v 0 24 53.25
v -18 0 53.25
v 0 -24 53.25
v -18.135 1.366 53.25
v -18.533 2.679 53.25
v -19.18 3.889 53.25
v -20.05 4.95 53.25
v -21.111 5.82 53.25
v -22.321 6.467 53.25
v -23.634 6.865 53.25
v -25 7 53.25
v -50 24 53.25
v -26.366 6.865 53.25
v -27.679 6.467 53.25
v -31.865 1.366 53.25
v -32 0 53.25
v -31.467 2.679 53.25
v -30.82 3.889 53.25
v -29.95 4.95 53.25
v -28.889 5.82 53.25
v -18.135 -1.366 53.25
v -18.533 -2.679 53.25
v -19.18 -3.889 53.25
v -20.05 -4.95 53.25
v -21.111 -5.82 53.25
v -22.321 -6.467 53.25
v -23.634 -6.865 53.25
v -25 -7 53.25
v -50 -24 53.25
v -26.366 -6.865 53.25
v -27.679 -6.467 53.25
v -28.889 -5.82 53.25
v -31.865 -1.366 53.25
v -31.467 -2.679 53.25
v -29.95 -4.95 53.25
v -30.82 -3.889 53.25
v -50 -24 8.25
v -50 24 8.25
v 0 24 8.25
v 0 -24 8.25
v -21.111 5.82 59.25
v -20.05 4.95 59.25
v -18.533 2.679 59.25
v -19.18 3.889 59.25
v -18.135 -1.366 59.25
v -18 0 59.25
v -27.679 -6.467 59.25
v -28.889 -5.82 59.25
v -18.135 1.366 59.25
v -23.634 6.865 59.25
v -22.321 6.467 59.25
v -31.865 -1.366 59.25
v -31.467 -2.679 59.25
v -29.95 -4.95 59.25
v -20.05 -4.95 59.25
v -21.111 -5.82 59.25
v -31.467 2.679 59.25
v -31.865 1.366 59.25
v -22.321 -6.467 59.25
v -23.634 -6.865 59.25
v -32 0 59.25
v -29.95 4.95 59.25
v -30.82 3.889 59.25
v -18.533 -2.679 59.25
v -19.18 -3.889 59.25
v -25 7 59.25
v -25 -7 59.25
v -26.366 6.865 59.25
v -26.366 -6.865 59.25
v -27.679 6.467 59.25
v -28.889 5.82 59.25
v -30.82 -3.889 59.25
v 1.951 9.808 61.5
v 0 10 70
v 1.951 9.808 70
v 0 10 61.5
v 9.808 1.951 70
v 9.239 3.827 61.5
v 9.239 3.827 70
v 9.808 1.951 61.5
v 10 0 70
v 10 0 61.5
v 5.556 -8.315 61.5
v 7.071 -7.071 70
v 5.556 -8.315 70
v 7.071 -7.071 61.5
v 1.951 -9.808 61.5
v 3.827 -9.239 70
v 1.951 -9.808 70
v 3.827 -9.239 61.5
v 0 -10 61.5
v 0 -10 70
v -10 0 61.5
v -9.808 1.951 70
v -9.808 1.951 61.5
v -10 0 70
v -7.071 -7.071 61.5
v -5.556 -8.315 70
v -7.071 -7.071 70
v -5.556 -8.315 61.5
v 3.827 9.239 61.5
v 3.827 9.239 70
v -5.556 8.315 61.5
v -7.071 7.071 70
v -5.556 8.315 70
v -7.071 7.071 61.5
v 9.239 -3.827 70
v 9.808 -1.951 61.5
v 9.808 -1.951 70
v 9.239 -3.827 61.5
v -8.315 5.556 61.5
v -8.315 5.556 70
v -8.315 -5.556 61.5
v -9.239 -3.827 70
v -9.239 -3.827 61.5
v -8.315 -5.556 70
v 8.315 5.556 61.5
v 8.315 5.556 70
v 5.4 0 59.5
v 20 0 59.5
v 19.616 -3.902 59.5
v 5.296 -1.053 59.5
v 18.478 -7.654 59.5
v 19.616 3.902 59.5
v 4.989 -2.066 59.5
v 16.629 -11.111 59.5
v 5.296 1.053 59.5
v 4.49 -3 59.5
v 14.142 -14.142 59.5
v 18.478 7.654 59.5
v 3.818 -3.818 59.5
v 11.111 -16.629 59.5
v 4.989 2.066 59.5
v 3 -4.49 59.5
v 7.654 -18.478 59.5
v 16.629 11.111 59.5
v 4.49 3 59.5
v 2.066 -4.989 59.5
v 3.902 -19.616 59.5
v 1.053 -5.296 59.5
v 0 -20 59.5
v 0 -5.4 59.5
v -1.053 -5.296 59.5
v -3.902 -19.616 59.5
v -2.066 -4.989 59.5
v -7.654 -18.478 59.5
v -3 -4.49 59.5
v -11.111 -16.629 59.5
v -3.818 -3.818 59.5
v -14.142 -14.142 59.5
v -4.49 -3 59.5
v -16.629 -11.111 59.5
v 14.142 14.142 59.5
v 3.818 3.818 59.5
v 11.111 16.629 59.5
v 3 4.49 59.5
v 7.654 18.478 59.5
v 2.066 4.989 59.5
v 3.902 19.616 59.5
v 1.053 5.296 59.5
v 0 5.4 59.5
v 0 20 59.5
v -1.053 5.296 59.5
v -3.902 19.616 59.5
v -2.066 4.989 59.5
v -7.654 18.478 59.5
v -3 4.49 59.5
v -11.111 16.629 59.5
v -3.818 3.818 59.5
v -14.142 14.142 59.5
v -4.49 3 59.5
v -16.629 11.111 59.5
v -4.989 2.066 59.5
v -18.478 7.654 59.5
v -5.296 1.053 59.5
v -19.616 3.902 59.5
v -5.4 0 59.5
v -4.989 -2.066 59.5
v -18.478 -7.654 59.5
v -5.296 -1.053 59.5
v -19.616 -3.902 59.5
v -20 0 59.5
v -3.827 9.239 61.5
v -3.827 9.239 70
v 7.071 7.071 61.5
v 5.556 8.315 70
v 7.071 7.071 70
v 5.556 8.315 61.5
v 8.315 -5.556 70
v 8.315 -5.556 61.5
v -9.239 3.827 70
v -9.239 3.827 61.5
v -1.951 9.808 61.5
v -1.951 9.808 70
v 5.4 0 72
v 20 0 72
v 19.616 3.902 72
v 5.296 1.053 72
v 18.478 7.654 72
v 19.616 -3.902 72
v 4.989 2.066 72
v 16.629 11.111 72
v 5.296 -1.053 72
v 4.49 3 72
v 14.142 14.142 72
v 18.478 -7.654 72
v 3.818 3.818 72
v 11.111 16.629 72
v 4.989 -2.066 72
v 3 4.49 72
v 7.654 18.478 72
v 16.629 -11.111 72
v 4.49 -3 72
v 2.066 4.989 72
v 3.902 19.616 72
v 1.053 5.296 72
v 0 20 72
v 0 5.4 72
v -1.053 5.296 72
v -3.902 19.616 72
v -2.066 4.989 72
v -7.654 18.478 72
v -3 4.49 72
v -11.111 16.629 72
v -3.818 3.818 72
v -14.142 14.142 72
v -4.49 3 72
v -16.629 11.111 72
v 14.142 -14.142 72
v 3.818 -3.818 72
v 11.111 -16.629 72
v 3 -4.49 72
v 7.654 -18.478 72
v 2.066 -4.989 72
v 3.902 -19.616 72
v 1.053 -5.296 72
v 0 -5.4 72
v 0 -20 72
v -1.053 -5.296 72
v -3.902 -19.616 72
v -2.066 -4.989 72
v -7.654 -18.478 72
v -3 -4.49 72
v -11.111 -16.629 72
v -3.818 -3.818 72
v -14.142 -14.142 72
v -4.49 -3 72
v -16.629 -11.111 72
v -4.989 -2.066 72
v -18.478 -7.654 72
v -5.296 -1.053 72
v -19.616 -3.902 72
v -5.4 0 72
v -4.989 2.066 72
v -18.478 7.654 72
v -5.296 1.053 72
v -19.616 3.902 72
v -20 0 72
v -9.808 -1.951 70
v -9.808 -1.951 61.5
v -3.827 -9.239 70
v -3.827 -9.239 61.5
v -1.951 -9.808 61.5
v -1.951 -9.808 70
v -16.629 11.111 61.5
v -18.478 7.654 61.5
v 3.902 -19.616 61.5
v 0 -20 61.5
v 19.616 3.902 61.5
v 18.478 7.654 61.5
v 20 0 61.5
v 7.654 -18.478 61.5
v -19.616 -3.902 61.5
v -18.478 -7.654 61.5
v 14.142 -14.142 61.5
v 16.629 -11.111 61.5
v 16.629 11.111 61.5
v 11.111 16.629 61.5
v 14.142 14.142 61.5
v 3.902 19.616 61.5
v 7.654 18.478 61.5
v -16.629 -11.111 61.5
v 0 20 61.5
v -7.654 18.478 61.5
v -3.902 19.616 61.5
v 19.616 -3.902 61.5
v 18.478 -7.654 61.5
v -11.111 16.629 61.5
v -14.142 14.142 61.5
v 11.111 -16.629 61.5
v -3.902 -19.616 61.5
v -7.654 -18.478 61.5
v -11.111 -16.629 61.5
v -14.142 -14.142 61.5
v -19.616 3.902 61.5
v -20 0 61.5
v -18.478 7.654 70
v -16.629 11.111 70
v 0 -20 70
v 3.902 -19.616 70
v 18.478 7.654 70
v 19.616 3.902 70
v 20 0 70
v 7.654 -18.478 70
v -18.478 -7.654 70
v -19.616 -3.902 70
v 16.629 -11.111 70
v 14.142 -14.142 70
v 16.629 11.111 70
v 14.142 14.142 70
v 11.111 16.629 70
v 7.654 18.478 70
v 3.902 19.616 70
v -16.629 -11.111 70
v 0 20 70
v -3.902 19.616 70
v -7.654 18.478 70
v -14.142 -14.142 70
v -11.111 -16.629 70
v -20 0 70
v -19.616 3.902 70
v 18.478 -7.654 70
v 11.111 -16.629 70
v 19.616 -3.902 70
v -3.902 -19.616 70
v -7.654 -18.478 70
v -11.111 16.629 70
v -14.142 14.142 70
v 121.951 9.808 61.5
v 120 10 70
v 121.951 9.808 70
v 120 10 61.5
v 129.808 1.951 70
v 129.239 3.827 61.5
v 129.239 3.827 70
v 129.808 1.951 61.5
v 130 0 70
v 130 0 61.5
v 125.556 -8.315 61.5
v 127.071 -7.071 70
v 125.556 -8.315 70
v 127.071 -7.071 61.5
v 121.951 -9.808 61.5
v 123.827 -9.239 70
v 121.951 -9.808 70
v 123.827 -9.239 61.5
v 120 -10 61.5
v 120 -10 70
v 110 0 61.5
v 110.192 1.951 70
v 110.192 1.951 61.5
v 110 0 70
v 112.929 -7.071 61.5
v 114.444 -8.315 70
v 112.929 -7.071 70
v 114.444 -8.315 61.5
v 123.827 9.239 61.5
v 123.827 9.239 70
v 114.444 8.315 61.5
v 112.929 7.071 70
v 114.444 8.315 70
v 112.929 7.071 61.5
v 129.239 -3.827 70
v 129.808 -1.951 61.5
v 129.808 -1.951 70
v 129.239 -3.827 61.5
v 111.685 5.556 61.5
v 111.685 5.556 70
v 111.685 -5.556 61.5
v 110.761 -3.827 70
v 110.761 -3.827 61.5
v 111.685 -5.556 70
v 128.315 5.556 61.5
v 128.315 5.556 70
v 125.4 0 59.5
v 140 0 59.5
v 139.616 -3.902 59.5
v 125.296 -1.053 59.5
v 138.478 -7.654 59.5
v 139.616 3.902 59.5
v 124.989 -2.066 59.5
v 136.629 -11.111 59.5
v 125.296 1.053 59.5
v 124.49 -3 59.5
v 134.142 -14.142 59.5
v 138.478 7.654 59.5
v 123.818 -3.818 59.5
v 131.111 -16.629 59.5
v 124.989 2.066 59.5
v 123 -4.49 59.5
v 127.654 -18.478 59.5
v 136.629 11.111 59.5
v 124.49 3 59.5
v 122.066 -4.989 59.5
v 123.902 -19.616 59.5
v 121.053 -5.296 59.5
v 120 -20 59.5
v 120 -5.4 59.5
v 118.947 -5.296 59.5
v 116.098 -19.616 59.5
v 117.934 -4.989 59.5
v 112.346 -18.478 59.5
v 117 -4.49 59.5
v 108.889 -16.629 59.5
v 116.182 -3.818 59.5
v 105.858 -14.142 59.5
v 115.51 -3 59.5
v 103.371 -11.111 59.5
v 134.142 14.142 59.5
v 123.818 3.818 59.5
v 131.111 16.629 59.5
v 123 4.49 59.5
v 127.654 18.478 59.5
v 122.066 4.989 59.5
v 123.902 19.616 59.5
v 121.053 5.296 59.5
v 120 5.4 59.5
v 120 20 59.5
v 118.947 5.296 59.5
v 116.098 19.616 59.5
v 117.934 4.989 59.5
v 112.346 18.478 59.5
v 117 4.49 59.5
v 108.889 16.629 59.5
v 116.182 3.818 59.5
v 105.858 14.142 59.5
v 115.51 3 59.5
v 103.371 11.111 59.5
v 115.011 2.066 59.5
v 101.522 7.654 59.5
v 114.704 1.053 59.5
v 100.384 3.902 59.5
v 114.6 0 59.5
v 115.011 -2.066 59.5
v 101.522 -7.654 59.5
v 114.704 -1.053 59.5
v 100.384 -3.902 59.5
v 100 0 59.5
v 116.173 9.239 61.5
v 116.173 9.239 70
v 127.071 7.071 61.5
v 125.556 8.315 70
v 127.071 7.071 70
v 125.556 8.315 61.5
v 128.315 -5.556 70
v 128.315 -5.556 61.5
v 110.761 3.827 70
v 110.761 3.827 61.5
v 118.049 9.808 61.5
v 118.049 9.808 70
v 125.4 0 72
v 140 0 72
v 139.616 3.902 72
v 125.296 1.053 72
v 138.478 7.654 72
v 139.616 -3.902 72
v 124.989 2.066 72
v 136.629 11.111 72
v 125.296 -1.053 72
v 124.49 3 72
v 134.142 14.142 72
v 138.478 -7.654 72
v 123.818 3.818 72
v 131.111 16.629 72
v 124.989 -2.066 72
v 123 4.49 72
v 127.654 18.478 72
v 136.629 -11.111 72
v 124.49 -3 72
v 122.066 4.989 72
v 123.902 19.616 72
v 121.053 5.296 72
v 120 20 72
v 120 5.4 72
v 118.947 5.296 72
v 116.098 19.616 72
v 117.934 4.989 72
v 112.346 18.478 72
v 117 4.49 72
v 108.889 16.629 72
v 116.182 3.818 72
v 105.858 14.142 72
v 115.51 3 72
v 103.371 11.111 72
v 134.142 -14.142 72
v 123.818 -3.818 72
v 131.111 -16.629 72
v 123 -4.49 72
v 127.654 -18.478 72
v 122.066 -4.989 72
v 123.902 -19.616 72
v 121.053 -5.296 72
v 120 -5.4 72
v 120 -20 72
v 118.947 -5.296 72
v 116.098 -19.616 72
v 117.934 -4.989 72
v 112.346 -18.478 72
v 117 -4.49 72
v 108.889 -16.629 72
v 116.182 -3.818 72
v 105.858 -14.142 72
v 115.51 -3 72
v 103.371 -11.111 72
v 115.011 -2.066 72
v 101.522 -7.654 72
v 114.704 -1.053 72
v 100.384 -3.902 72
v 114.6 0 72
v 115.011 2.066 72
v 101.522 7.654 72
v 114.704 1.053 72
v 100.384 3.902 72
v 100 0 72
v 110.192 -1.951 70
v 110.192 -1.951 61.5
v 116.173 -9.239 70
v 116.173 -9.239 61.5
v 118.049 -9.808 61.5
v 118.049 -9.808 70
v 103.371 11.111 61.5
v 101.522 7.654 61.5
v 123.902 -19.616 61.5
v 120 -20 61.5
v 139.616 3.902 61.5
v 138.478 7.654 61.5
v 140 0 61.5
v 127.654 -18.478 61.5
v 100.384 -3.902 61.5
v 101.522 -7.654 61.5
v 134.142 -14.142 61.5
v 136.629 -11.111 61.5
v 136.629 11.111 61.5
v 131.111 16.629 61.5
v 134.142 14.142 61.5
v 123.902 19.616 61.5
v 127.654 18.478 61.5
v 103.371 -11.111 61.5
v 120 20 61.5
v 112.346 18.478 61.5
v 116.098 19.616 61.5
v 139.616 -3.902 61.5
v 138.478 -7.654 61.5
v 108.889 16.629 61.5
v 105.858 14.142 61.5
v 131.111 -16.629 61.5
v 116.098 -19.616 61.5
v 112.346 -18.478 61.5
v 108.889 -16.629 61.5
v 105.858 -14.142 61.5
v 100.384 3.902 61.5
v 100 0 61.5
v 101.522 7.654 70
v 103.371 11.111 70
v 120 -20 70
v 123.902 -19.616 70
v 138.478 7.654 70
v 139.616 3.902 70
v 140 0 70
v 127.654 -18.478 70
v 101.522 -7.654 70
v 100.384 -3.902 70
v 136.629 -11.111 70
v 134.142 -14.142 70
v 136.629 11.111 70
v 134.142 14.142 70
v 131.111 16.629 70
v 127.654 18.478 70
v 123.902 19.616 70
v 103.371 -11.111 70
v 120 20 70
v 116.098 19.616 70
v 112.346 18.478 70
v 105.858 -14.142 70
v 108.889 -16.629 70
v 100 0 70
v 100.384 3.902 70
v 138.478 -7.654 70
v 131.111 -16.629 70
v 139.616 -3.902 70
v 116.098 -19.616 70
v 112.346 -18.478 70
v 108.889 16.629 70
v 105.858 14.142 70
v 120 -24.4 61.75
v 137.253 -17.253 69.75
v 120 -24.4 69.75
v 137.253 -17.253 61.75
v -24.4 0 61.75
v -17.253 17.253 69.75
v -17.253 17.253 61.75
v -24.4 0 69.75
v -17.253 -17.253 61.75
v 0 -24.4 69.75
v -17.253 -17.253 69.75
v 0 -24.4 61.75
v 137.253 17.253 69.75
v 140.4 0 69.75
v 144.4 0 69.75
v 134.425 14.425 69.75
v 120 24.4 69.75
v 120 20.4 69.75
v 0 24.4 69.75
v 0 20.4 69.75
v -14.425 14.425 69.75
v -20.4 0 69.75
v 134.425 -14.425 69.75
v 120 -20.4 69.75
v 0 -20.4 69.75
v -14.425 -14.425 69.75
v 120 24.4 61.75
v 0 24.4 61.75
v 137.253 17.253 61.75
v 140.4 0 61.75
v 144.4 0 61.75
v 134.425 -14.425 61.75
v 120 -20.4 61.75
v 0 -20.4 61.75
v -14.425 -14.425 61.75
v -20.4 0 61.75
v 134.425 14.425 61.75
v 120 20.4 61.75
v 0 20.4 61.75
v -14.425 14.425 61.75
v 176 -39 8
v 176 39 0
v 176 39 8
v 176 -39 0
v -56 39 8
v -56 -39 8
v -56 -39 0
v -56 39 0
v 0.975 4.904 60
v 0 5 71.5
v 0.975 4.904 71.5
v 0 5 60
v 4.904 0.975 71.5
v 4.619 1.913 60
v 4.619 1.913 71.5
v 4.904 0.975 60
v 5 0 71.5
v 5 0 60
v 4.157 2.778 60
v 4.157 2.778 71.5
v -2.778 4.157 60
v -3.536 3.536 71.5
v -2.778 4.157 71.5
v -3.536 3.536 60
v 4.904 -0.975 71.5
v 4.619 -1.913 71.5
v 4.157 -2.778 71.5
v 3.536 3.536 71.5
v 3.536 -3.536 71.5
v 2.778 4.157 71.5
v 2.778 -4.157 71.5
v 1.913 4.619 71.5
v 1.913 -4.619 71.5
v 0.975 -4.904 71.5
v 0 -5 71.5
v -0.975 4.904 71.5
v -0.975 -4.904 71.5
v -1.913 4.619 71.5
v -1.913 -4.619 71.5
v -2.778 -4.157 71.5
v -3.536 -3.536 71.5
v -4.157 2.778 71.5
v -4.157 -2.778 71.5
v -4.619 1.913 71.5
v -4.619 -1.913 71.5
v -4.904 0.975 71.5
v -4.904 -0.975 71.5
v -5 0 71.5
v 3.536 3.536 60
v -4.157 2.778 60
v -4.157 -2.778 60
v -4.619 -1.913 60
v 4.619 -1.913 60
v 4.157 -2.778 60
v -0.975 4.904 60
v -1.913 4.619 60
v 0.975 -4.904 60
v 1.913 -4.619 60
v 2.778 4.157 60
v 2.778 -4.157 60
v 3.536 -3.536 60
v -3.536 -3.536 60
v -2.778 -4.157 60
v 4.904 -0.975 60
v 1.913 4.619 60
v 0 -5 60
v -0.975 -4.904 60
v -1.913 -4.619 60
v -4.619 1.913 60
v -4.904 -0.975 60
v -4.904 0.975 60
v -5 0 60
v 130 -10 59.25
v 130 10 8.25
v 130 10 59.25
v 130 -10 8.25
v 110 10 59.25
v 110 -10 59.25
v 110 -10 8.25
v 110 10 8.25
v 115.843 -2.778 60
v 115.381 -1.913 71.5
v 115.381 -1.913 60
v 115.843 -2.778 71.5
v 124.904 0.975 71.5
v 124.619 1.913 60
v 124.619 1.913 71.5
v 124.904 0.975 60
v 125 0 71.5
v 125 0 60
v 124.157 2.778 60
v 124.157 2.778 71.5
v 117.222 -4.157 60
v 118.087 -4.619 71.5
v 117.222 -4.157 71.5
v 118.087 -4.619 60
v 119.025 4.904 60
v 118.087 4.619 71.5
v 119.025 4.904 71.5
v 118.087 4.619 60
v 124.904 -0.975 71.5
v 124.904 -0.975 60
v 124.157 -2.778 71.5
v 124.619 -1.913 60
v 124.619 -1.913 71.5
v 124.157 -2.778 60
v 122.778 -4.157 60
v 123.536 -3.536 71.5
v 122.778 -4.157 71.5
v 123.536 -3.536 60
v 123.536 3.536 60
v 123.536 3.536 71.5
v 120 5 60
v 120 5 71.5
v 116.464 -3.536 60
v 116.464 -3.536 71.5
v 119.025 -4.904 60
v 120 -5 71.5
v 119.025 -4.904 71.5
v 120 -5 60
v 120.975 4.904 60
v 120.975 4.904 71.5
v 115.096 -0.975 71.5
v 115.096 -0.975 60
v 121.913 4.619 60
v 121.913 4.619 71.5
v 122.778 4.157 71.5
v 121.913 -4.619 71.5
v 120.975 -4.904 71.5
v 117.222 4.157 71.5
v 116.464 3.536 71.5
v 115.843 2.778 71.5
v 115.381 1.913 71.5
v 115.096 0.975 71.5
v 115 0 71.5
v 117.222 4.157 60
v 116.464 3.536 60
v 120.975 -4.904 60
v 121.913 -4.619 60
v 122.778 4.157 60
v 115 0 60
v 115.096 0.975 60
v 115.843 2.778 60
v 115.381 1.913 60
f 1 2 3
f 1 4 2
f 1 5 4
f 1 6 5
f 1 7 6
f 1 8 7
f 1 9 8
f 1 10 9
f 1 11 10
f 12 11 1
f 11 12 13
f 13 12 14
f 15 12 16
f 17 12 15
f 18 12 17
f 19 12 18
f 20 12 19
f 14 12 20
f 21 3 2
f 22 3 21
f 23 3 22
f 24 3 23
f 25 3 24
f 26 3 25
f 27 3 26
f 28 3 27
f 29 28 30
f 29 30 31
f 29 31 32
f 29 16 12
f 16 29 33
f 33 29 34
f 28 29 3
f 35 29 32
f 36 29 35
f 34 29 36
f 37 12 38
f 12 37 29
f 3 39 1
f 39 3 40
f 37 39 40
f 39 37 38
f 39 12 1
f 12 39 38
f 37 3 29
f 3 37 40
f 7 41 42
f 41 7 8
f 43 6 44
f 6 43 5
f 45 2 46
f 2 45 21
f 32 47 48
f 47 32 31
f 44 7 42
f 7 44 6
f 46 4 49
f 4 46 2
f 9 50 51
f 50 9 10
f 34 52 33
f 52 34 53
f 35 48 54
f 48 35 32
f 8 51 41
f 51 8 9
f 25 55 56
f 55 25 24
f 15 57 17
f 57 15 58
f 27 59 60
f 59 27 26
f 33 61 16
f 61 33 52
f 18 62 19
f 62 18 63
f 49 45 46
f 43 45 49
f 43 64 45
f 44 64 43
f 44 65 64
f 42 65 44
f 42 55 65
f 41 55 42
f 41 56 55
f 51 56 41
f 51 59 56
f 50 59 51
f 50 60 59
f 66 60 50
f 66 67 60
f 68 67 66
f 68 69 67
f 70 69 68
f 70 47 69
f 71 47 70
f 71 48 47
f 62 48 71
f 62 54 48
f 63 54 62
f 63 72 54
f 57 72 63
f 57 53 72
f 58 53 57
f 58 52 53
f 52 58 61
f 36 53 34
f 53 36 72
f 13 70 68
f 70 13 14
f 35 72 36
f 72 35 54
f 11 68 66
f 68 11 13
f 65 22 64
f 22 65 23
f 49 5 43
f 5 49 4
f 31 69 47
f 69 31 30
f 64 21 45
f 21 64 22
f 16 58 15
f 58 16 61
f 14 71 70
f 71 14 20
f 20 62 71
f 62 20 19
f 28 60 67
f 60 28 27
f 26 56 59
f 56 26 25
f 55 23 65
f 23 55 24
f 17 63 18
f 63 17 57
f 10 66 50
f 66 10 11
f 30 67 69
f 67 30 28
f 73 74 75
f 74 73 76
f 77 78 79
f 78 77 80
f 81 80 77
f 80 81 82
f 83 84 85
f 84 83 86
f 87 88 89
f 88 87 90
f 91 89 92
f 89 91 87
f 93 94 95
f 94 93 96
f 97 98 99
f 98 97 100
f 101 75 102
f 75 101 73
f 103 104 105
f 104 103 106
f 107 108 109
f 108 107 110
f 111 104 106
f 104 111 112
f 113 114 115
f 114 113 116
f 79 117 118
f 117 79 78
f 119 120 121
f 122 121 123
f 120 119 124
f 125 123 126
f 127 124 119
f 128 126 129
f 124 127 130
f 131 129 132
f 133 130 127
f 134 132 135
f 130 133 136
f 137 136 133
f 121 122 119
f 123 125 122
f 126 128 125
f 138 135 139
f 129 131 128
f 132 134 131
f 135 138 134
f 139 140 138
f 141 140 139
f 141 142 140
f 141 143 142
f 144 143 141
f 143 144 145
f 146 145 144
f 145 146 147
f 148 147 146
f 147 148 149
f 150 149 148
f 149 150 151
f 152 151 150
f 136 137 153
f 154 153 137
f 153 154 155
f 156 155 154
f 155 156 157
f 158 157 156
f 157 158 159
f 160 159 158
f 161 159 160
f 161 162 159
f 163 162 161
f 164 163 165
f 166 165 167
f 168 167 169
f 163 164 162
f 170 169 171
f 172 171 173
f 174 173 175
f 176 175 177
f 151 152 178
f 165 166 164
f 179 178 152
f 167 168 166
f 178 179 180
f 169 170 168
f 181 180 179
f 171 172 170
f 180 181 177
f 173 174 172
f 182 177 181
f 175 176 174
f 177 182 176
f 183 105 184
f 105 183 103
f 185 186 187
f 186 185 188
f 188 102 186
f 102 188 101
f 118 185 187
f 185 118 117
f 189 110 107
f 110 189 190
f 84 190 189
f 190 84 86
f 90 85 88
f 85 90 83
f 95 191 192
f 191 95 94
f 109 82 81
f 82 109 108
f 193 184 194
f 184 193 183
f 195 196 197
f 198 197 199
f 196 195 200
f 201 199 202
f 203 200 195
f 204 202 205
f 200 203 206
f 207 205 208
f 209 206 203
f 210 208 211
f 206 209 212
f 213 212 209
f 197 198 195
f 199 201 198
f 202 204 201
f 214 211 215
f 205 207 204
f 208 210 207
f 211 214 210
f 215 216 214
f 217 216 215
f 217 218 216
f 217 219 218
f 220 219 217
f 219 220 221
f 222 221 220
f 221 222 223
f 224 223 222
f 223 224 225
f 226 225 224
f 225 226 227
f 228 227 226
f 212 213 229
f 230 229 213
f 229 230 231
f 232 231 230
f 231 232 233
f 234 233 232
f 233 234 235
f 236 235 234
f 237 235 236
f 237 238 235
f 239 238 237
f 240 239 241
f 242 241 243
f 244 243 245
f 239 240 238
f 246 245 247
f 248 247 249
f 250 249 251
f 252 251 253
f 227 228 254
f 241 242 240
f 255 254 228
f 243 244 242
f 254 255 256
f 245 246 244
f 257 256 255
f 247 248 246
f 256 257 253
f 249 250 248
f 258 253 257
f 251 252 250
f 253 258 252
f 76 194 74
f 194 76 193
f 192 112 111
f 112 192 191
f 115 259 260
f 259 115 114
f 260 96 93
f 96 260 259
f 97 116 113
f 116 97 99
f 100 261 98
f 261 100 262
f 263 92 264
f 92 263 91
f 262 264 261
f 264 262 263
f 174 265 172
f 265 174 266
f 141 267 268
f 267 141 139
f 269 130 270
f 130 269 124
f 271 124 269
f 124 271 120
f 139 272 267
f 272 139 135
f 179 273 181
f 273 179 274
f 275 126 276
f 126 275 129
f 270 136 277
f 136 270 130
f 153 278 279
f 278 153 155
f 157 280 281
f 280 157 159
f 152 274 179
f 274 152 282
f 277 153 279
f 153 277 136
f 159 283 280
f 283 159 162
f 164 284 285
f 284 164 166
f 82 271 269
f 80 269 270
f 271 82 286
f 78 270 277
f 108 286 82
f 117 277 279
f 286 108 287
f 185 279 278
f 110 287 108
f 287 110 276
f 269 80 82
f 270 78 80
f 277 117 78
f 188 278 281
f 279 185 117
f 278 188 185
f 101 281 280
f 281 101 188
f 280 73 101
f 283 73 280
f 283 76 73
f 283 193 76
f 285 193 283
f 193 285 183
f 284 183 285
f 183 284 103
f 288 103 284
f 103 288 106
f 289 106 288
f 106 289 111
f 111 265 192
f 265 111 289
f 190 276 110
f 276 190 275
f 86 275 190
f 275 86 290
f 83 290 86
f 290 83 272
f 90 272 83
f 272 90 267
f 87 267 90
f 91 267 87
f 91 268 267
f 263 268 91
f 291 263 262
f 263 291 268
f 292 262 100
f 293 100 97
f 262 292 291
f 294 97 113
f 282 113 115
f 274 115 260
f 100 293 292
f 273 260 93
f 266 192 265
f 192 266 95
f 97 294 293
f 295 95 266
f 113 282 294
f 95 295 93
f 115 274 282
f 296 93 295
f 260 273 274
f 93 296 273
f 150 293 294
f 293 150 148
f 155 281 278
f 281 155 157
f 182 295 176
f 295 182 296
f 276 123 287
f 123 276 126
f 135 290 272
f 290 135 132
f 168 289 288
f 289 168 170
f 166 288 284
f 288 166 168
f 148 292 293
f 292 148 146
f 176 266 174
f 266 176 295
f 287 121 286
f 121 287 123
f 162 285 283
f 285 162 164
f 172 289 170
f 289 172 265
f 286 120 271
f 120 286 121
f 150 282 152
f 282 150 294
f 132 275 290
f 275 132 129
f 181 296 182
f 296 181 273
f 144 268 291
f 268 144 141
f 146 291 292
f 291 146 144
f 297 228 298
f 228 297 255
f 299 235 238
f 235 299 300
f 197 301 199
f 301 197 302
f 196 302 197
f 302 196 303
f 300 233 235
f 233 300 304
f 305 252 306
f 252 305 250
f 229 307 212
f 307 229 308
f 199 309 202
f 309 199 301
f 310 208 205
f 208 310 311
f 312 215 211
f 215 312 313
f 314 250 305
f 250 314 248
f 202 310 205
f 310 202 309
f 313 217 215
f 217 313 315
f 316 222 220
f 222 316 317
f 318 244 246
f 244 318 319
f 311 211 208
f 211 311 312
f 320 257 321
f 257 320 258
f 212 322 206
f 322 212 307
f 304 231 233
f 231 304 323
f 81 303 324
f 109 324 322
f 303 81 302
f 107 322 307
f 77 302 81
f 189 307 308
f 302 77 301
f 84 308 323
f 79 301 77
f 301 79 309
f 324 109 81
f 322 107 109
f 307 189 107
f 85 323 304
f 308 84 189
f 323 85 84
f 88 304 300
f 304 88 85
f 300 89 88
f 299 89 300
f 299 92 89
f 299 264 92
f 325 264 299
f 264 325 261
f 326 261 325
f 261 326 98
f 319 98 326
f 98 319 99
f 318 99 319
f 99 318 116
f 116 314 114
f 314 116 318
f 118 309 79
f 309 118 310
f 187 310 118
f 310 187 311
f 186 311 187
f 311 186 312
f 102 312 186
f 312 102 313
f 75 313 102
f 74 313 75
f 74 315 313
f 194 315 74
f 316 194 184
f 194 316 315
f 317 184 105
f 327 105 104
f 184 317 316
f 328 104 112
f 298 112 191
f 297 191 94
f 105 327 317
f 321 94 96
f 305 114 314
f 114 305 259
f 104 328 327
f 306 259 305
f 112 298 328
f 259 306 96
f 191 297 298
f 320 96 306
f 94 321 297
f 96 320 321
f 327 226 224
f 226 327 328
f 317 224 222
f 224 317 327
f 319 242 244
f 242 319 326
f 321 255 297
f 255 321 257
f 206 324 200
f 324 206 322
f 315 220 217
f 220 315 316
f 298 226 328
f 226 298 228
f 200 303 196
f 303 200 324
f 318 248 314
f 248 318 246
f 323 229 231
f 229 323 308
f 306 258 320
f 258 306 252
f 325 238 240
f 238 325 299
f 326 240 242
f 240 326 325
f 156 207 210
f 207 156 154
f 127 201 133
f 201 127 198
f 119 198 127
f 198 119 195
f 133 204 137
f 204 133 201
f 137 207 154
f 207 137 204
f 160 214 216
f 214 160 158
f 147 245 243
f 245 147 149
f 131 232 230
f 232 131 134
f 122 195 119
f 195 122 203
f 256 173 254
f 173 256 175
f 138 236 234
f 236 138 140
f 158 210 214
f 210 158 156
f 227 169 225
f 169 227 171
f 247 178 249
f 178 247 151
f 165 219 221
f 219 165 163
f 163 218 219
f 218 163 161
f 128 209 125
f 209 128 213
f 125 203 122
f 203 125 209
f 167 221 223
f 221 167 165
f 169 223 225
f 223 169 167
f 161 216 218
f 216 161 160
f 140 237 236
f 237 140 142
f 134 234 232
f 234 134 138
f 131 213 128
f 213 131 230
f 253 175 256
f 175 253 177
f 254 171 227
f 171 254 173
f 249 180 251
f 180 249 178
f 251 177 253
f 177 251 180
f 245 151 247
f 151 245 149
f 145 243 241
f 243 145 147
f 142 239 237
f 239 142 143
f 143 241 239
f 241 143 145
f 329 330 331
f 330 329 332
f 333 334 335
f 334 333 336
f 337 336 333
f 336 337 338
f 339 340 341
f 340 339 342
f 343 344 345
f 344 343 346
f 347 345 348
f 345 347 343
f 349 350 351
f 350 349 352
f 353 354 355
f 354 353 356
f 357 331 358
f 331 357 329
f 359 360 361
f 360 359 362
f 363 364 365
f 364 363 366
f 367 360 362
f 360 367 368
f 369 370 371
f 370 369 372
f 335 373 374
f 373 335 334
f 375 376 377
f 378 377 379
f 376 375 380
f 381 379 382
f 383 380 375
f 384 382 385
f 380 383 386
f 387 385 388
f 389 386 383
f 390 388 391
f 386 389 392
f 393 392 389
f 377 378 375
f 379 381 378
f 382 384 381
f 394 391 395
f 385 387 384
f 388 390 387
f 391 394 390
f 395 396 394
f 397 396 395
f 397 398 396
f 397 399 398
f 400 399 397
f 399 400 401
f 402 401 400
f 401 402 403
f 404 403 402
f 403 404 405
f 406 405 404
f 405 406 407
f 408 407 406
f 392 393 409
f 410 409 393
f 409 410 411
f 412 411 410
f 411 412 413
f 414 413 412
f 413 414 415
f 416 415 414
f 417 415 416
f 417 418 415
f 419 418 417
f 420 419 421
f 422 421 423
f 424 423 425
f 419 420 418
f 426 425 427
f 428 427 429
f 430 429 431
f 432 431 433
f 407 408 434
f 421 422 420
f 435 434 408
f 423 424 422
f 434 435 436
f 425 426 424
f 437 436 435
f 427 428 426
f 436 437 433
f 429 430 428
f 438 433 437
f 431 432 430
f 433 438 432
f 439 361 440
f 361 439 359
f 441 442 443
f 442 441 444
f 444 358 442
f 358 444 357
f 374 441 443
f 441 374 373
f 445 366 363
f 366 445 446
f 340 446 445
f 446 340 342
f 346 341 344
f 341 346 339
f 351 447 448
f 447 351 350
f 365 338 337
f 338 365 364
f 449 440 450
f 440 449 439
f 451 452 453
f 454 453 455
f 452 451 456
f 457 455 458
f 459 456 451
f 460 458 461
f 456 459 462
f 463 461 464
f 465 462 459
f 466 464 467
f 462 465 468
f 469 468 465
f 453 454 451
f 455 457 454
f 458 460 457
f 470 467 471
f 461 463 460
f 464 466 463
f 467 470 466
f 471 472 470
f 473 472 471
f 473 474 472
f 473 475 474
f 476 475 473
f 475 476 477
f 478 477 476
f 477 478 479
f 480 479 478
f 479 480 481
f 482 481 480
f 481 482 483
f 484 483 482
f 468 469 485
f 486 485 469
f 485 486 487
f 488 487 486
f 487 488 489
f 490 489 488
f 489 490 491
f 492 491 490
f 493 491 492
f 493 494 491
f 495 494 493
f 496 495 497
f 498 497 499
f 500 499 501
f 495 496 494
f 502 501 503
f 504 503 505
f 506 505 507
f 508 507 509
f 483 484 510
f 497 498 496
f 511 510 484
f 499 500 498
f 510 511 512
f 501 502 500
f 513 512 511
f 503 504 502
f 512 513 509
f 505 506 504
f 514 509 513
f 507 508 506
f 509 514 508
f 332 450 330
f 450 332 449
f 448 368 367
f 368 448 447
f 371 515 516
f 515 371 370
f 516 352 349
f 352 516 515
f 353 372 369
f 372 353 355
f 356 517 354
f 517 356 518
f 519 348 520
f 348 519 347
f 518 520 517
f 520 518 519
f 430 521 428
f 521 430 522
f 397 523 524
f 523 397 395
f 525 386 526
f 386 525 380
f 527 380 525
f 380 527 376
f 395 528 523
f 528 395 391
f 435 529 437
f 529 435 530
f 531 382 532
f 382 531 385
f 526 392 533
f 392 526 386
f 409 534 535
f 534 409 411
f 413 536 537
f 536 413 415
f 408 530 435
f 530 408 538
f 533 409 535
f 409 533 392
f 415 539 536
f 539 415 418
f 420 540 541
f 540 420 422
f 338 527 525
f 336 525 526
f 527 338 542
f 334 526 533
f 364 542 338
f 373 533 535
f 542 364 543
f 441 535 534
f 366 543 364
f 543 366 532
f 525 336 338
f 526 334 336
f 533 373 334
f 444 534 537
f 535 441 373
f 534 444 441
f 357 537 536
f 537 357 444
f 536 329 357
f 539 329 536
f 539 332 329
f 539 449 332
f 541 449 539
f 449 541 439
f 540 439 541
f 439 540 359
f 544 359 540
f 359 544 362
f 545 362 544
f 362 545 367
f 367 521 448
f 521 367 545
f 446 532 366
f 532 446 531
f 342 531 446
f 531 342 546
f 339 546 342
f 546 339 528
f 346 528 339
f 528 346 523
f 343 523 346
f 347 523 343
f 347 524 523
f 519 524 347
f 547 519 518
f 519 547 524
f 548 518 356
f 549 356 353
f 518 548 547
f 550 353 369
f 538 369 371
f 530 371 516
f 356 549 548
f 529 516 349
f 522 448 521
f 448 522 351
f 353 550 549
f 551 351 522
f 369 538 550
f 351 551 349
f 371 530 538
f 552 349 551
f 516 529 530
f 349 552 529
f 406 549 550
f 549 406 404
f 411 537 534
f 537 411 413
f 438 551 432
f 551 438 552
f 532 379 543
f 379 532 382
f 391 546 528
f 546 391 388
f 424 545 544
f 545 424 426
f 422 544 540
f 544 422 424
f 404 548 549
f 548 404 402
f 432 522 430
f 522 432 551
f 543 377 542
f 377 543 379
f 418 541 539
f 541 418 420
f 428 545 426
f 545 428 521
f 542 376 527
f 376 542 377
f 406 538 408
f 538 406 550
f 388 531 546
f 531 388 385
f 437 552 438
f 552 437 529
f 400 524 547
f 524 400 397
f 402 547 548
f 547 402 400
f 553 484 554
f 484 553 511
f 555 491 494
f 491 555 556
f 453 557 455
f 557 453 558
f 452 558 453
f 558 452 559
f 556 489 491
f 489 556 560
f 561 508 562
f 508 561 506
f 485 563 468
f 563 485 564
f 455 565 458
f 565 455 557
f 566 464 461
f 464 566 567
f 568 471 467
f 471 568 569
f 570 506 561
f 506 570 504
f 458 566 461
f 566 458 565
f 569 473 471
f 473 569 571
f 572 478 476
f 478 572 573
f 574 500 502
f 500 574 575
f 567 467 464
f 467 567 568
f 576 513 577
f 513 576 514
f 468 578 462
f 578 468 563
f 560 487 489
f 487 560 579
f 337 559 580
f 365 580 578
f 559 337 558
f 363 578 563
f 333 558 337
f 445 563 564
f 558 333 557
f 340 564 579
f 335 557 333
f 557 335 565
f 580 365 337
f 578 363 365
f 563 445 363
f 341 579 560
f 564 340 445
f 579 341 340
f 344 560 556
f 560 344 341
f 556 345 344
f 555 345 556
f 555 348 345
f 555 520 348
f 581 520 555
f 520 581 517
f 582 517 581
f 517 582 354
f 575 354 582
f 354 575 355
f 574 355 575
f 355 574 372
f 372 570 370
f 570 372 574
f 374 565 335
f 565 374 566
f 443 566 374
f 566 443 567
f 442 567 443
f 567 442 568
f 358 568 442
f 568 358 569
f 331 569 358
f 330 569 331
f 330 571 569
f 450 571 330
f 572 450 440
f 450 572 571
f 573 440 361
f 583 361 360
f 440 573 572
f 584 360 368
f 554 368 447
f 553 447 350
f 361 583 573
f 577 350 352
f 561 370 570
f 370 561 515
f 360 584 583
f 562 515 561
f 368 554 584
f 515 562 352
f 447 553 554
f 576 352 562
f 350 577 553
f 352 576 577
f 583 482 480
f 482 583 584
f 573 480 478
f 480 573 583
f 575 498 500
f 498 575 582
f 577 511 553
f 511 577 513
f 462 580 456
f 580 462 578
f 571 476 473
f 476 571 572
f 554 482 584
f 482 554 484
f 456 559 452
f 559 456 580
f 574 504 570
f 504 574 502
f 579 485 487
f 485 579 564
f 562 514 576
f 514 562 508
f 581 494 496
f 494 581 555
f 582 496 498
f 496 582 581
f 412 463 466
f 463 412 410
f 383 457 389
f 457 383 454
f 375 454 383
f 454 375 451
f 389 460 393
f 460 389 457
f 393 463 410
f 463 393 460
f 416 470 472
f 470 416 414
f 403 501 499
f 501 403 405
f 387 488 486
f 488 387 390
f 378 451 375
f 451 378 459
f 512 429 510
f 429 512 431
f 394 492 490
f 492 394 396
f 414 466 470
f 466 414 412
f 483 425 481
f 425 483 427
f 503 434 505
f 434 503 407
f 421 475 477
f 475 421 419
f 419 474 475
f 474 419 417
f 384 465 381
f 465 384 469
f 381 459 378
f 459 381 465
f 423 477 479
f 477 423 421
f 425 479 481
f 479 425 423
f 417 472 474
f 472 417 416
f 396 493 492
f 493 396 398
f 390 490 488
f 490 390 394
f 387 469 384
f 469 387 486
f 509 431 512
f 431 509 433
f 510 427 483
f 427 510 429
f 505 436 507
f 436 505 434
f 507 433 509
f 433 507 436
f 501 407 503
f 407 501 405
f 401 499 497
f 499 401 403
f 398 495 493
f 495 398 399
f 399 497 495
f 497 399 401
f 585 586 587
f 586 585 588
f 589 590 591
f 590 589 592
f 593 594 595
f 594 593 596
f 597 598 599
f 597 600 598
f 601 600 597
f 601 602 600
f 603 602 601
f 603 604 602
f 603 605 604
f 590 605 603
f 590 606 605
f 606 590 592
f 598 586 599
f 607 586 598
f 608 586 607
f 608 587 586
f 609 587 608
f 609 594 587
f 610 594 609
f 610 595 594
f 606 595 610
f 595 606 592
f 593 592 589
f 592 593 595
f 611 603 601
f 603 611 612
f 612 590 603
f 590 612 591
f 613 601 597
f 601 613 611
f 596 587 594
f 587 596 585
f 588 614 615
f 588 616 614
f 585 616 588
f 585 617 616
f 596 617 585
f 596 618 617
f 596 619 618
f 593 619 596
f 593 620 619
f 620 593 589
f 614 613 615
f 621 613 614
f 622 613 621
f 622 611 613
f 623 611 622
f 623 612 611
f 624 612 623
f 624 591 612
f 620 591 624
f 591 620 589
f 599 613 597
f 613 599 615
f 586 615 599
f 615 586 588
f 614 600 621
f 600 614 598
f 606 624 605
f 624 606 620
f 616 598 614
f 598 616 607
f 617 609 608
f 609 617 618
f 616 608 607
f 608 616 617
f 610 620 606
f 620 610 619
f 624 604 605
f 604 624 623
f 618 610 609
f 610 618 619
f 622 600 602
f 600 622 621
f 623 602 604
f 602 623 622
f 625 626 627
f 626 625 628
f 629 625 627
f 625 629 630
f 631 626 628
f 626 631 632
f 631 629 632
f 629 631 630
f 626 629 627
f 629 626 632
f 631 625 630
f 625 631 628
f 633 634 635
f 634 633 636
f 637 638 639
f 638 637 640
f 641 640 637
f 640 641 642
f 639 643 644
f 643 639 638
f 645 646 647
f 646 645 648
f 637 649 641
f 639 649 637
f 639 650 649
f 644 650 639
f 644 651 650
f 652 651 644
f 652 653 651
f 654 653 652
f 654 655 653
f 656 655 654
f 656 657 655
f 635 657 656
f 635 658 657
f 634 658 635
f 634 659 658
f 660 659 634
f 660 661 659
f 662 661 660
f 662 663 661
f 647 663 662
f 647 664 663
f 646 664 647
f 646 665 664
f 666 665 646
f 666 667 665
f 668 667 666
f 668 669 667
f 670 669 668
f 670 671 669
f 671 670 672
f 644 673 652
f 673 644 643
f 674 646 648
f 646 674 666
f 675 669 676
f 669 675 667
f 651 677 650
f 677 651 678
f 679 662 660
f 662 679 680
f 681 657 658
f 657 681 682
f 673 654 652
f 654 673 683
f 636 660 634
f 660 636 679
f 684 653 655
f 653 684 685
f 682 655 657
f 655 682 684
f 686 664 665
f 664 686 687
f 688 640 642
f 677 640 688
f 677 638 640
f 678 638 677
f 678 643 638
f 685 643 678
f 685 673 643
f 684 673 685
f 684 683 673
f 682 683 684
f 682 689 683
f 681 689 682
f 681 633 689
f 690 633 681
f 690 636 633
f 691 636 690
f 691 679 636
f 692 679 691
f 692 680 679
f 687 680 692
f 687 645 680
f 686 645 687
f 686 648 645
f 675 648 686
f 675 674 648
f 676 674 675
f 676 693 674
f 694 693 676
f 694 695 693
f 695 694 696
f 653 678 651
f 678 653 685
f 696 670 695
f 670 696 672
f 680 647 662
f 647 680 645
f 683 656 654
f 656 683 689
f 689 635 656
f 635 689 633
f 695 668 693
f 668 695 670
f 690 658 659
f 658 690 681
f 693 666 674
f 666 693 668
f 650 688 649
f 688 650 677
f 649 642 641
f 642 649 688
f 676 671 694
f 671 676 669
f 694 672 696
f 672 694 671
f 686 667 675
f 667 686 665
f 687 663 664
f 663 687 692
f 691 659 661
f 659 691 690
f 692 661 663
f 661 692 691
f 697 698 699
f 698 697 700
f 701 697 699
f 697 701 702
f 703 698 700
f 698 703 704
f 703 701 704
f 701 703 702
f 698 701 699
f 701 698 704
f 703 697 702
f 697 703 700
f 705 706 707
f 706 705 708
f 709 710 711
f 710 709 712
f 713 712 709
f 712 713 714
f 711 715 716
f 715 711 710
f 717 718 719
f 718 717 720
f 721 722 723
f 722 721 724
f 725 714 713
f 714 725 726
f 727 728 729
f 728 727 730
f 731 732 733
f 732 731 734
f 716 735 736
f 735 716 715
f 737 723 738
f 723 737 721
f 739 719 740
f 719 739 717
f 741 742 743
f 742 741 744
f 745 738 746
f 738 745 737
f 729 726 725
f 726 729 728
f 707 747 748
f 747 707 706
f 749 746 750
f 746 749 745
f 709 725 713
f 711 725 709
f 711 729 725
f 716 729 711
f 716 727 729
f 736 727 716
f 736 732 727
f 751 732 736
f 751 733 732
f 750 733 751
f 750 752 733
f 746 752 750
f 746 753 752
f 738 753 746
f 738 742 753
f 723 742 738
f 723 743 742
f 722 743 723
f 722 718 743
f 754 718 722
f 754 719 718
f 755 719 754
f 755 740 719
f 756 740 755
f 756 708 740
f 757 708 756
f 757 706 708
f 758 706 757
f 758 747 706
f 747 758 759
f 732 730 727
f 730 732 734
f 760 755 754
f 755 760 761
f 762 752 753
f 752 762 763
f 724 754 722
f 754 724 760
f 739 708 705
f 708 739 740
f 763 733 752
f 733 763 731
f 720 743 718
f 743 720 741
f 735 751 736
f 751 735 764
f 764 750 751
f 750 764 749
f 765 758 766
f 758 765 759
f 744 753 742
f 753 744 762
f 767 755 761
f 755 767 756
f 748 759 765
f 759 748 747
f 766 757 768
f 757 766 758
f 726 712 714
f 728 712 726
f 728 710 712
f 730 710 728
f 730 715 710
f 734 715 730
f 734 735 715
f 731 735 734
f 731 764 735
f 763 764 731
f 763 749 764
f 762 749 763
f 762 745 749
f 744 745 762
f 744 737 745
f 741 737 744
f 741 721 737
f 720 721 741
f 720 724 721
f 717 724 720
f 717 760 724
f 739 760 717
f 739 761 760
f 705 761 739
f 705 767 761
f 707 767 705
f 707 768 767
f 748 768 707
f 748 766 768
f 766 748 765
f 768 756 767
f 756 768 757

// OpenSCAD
$fn = 32;

// ------------------------------------------------------------------------
// Motor belt drive: span 120 mm, pulleys d40, belt 8 mm wide
// Every part is its own module, assembly() places every instance.
// ------------------------------------------------------------------------

// --- part 1 ---
module base_plate() {
  difference() {
    translate([-116, -39, 0]) cube([232, 78, 8]);
  }
}

// --- part 2 ---
module motor() {
  union() {
    translate([-22.5, -24, 0]) cube([45, 48, 50]);
    translate([25.5, 0, 25]) rotate([0, 90, 0]) cylinder(h = 6, d = 14, center = true);
  }
}

// --- part 3 ---
module drive_shaft() {
  translate([0, 0, -5.75]) cylinder(h = 11.5, d = 10);
}

// --- part 4 ---
module pulley_drive() {
  difference() {
    union() {
      cylinder(h = 12.5, d = 20);
      cylinder(h = 2, d = 40);
      translate([0, 0, 10.5]) cylinder(h = 2, d = 40);
    }
    translate([0, 0, -1]) cylinder(h = 14.5, d = 10.8);
  }
}

// --- part 5 ---
module idler_post() {
  translate([-10, -10, 0]) cube([20, 20, 51]);
}

// --- part 6 ---
module driven_shaft() {
  translate([0, 0, -5.75]) cylinder(h = 11.5, d = 10);
}

// --- part 7 ---
module pulley_driven() {
  difference() {
    union() {
      cylinder(h = 12.5, d = 20);
      cylinder(h = 2, d = 40);
      translate([0, 0, 10.5]) cylinder(h = 2, d = 40);
    }
    translate([0, 0, -1]) cylinder(h = 14.5, d = 10.8);
  }
}

// --- part 8 ---
module drive_belt() {
  difference() {
    linear_extrude(height = 8) polygon(points = concat([for (a = [90 : 45 : 270]) [24.4 * cos(a), 24.4 * sin(a)]], [for (a = [270 : 45 : 450]) [120 + 24.4 * cos(a), 24.4 * sin(a)]]));
    translate([0, 0, -1]) linear_extrude(height = 10) polygon(points = concat([for (a = [90 : 45 : 270]) [20.4 * cos(a), 20.4 * sin(a)]], [for (a = [270 : 45 : 450]) [120 + 20.4 * cos(a), 20.4 * sin(a)]]));
  }
}

// --- assembly ---
module assembly() {
  color([0.80, 0.24, 0.20]) translate([60, 0, 0]) rotate([0, 0, 0]) base_plate();
  color([0.20, 0.45, 0.75]) translate([0, 0, 30.75]) rotate([0, 270, 0]) motor();
  color([0.25, 0.62, 0.32]) translate([0, 0, 65.75]) rotate([0, 0, 0]) drive_shaft();
  color([0.92, 0.70, 0.18]) translate([0, 0, 59.5]) rotate([0, 0, 0]) pulley_drive();
  color([0.58, 0.35, 0.70]) translate([120, 0, 8.25]) rotate([0, 0, 0]) idler_post();
  color([0.16, 0.66, 0.66]) translate([120, 0, 65.75]) rotate([0, 0, 0]) driven_shaft();
  color([0.85, 0.48, 0.18]) translate([120, 0, 59.5]) rotate([0, 0, 0]) pulley_driven();
  color([0.55, 0.60, 0.65]) translate([0, 0, 61.75]) rotate([0, 0, 0]) drive_belt();
}

assembly();
